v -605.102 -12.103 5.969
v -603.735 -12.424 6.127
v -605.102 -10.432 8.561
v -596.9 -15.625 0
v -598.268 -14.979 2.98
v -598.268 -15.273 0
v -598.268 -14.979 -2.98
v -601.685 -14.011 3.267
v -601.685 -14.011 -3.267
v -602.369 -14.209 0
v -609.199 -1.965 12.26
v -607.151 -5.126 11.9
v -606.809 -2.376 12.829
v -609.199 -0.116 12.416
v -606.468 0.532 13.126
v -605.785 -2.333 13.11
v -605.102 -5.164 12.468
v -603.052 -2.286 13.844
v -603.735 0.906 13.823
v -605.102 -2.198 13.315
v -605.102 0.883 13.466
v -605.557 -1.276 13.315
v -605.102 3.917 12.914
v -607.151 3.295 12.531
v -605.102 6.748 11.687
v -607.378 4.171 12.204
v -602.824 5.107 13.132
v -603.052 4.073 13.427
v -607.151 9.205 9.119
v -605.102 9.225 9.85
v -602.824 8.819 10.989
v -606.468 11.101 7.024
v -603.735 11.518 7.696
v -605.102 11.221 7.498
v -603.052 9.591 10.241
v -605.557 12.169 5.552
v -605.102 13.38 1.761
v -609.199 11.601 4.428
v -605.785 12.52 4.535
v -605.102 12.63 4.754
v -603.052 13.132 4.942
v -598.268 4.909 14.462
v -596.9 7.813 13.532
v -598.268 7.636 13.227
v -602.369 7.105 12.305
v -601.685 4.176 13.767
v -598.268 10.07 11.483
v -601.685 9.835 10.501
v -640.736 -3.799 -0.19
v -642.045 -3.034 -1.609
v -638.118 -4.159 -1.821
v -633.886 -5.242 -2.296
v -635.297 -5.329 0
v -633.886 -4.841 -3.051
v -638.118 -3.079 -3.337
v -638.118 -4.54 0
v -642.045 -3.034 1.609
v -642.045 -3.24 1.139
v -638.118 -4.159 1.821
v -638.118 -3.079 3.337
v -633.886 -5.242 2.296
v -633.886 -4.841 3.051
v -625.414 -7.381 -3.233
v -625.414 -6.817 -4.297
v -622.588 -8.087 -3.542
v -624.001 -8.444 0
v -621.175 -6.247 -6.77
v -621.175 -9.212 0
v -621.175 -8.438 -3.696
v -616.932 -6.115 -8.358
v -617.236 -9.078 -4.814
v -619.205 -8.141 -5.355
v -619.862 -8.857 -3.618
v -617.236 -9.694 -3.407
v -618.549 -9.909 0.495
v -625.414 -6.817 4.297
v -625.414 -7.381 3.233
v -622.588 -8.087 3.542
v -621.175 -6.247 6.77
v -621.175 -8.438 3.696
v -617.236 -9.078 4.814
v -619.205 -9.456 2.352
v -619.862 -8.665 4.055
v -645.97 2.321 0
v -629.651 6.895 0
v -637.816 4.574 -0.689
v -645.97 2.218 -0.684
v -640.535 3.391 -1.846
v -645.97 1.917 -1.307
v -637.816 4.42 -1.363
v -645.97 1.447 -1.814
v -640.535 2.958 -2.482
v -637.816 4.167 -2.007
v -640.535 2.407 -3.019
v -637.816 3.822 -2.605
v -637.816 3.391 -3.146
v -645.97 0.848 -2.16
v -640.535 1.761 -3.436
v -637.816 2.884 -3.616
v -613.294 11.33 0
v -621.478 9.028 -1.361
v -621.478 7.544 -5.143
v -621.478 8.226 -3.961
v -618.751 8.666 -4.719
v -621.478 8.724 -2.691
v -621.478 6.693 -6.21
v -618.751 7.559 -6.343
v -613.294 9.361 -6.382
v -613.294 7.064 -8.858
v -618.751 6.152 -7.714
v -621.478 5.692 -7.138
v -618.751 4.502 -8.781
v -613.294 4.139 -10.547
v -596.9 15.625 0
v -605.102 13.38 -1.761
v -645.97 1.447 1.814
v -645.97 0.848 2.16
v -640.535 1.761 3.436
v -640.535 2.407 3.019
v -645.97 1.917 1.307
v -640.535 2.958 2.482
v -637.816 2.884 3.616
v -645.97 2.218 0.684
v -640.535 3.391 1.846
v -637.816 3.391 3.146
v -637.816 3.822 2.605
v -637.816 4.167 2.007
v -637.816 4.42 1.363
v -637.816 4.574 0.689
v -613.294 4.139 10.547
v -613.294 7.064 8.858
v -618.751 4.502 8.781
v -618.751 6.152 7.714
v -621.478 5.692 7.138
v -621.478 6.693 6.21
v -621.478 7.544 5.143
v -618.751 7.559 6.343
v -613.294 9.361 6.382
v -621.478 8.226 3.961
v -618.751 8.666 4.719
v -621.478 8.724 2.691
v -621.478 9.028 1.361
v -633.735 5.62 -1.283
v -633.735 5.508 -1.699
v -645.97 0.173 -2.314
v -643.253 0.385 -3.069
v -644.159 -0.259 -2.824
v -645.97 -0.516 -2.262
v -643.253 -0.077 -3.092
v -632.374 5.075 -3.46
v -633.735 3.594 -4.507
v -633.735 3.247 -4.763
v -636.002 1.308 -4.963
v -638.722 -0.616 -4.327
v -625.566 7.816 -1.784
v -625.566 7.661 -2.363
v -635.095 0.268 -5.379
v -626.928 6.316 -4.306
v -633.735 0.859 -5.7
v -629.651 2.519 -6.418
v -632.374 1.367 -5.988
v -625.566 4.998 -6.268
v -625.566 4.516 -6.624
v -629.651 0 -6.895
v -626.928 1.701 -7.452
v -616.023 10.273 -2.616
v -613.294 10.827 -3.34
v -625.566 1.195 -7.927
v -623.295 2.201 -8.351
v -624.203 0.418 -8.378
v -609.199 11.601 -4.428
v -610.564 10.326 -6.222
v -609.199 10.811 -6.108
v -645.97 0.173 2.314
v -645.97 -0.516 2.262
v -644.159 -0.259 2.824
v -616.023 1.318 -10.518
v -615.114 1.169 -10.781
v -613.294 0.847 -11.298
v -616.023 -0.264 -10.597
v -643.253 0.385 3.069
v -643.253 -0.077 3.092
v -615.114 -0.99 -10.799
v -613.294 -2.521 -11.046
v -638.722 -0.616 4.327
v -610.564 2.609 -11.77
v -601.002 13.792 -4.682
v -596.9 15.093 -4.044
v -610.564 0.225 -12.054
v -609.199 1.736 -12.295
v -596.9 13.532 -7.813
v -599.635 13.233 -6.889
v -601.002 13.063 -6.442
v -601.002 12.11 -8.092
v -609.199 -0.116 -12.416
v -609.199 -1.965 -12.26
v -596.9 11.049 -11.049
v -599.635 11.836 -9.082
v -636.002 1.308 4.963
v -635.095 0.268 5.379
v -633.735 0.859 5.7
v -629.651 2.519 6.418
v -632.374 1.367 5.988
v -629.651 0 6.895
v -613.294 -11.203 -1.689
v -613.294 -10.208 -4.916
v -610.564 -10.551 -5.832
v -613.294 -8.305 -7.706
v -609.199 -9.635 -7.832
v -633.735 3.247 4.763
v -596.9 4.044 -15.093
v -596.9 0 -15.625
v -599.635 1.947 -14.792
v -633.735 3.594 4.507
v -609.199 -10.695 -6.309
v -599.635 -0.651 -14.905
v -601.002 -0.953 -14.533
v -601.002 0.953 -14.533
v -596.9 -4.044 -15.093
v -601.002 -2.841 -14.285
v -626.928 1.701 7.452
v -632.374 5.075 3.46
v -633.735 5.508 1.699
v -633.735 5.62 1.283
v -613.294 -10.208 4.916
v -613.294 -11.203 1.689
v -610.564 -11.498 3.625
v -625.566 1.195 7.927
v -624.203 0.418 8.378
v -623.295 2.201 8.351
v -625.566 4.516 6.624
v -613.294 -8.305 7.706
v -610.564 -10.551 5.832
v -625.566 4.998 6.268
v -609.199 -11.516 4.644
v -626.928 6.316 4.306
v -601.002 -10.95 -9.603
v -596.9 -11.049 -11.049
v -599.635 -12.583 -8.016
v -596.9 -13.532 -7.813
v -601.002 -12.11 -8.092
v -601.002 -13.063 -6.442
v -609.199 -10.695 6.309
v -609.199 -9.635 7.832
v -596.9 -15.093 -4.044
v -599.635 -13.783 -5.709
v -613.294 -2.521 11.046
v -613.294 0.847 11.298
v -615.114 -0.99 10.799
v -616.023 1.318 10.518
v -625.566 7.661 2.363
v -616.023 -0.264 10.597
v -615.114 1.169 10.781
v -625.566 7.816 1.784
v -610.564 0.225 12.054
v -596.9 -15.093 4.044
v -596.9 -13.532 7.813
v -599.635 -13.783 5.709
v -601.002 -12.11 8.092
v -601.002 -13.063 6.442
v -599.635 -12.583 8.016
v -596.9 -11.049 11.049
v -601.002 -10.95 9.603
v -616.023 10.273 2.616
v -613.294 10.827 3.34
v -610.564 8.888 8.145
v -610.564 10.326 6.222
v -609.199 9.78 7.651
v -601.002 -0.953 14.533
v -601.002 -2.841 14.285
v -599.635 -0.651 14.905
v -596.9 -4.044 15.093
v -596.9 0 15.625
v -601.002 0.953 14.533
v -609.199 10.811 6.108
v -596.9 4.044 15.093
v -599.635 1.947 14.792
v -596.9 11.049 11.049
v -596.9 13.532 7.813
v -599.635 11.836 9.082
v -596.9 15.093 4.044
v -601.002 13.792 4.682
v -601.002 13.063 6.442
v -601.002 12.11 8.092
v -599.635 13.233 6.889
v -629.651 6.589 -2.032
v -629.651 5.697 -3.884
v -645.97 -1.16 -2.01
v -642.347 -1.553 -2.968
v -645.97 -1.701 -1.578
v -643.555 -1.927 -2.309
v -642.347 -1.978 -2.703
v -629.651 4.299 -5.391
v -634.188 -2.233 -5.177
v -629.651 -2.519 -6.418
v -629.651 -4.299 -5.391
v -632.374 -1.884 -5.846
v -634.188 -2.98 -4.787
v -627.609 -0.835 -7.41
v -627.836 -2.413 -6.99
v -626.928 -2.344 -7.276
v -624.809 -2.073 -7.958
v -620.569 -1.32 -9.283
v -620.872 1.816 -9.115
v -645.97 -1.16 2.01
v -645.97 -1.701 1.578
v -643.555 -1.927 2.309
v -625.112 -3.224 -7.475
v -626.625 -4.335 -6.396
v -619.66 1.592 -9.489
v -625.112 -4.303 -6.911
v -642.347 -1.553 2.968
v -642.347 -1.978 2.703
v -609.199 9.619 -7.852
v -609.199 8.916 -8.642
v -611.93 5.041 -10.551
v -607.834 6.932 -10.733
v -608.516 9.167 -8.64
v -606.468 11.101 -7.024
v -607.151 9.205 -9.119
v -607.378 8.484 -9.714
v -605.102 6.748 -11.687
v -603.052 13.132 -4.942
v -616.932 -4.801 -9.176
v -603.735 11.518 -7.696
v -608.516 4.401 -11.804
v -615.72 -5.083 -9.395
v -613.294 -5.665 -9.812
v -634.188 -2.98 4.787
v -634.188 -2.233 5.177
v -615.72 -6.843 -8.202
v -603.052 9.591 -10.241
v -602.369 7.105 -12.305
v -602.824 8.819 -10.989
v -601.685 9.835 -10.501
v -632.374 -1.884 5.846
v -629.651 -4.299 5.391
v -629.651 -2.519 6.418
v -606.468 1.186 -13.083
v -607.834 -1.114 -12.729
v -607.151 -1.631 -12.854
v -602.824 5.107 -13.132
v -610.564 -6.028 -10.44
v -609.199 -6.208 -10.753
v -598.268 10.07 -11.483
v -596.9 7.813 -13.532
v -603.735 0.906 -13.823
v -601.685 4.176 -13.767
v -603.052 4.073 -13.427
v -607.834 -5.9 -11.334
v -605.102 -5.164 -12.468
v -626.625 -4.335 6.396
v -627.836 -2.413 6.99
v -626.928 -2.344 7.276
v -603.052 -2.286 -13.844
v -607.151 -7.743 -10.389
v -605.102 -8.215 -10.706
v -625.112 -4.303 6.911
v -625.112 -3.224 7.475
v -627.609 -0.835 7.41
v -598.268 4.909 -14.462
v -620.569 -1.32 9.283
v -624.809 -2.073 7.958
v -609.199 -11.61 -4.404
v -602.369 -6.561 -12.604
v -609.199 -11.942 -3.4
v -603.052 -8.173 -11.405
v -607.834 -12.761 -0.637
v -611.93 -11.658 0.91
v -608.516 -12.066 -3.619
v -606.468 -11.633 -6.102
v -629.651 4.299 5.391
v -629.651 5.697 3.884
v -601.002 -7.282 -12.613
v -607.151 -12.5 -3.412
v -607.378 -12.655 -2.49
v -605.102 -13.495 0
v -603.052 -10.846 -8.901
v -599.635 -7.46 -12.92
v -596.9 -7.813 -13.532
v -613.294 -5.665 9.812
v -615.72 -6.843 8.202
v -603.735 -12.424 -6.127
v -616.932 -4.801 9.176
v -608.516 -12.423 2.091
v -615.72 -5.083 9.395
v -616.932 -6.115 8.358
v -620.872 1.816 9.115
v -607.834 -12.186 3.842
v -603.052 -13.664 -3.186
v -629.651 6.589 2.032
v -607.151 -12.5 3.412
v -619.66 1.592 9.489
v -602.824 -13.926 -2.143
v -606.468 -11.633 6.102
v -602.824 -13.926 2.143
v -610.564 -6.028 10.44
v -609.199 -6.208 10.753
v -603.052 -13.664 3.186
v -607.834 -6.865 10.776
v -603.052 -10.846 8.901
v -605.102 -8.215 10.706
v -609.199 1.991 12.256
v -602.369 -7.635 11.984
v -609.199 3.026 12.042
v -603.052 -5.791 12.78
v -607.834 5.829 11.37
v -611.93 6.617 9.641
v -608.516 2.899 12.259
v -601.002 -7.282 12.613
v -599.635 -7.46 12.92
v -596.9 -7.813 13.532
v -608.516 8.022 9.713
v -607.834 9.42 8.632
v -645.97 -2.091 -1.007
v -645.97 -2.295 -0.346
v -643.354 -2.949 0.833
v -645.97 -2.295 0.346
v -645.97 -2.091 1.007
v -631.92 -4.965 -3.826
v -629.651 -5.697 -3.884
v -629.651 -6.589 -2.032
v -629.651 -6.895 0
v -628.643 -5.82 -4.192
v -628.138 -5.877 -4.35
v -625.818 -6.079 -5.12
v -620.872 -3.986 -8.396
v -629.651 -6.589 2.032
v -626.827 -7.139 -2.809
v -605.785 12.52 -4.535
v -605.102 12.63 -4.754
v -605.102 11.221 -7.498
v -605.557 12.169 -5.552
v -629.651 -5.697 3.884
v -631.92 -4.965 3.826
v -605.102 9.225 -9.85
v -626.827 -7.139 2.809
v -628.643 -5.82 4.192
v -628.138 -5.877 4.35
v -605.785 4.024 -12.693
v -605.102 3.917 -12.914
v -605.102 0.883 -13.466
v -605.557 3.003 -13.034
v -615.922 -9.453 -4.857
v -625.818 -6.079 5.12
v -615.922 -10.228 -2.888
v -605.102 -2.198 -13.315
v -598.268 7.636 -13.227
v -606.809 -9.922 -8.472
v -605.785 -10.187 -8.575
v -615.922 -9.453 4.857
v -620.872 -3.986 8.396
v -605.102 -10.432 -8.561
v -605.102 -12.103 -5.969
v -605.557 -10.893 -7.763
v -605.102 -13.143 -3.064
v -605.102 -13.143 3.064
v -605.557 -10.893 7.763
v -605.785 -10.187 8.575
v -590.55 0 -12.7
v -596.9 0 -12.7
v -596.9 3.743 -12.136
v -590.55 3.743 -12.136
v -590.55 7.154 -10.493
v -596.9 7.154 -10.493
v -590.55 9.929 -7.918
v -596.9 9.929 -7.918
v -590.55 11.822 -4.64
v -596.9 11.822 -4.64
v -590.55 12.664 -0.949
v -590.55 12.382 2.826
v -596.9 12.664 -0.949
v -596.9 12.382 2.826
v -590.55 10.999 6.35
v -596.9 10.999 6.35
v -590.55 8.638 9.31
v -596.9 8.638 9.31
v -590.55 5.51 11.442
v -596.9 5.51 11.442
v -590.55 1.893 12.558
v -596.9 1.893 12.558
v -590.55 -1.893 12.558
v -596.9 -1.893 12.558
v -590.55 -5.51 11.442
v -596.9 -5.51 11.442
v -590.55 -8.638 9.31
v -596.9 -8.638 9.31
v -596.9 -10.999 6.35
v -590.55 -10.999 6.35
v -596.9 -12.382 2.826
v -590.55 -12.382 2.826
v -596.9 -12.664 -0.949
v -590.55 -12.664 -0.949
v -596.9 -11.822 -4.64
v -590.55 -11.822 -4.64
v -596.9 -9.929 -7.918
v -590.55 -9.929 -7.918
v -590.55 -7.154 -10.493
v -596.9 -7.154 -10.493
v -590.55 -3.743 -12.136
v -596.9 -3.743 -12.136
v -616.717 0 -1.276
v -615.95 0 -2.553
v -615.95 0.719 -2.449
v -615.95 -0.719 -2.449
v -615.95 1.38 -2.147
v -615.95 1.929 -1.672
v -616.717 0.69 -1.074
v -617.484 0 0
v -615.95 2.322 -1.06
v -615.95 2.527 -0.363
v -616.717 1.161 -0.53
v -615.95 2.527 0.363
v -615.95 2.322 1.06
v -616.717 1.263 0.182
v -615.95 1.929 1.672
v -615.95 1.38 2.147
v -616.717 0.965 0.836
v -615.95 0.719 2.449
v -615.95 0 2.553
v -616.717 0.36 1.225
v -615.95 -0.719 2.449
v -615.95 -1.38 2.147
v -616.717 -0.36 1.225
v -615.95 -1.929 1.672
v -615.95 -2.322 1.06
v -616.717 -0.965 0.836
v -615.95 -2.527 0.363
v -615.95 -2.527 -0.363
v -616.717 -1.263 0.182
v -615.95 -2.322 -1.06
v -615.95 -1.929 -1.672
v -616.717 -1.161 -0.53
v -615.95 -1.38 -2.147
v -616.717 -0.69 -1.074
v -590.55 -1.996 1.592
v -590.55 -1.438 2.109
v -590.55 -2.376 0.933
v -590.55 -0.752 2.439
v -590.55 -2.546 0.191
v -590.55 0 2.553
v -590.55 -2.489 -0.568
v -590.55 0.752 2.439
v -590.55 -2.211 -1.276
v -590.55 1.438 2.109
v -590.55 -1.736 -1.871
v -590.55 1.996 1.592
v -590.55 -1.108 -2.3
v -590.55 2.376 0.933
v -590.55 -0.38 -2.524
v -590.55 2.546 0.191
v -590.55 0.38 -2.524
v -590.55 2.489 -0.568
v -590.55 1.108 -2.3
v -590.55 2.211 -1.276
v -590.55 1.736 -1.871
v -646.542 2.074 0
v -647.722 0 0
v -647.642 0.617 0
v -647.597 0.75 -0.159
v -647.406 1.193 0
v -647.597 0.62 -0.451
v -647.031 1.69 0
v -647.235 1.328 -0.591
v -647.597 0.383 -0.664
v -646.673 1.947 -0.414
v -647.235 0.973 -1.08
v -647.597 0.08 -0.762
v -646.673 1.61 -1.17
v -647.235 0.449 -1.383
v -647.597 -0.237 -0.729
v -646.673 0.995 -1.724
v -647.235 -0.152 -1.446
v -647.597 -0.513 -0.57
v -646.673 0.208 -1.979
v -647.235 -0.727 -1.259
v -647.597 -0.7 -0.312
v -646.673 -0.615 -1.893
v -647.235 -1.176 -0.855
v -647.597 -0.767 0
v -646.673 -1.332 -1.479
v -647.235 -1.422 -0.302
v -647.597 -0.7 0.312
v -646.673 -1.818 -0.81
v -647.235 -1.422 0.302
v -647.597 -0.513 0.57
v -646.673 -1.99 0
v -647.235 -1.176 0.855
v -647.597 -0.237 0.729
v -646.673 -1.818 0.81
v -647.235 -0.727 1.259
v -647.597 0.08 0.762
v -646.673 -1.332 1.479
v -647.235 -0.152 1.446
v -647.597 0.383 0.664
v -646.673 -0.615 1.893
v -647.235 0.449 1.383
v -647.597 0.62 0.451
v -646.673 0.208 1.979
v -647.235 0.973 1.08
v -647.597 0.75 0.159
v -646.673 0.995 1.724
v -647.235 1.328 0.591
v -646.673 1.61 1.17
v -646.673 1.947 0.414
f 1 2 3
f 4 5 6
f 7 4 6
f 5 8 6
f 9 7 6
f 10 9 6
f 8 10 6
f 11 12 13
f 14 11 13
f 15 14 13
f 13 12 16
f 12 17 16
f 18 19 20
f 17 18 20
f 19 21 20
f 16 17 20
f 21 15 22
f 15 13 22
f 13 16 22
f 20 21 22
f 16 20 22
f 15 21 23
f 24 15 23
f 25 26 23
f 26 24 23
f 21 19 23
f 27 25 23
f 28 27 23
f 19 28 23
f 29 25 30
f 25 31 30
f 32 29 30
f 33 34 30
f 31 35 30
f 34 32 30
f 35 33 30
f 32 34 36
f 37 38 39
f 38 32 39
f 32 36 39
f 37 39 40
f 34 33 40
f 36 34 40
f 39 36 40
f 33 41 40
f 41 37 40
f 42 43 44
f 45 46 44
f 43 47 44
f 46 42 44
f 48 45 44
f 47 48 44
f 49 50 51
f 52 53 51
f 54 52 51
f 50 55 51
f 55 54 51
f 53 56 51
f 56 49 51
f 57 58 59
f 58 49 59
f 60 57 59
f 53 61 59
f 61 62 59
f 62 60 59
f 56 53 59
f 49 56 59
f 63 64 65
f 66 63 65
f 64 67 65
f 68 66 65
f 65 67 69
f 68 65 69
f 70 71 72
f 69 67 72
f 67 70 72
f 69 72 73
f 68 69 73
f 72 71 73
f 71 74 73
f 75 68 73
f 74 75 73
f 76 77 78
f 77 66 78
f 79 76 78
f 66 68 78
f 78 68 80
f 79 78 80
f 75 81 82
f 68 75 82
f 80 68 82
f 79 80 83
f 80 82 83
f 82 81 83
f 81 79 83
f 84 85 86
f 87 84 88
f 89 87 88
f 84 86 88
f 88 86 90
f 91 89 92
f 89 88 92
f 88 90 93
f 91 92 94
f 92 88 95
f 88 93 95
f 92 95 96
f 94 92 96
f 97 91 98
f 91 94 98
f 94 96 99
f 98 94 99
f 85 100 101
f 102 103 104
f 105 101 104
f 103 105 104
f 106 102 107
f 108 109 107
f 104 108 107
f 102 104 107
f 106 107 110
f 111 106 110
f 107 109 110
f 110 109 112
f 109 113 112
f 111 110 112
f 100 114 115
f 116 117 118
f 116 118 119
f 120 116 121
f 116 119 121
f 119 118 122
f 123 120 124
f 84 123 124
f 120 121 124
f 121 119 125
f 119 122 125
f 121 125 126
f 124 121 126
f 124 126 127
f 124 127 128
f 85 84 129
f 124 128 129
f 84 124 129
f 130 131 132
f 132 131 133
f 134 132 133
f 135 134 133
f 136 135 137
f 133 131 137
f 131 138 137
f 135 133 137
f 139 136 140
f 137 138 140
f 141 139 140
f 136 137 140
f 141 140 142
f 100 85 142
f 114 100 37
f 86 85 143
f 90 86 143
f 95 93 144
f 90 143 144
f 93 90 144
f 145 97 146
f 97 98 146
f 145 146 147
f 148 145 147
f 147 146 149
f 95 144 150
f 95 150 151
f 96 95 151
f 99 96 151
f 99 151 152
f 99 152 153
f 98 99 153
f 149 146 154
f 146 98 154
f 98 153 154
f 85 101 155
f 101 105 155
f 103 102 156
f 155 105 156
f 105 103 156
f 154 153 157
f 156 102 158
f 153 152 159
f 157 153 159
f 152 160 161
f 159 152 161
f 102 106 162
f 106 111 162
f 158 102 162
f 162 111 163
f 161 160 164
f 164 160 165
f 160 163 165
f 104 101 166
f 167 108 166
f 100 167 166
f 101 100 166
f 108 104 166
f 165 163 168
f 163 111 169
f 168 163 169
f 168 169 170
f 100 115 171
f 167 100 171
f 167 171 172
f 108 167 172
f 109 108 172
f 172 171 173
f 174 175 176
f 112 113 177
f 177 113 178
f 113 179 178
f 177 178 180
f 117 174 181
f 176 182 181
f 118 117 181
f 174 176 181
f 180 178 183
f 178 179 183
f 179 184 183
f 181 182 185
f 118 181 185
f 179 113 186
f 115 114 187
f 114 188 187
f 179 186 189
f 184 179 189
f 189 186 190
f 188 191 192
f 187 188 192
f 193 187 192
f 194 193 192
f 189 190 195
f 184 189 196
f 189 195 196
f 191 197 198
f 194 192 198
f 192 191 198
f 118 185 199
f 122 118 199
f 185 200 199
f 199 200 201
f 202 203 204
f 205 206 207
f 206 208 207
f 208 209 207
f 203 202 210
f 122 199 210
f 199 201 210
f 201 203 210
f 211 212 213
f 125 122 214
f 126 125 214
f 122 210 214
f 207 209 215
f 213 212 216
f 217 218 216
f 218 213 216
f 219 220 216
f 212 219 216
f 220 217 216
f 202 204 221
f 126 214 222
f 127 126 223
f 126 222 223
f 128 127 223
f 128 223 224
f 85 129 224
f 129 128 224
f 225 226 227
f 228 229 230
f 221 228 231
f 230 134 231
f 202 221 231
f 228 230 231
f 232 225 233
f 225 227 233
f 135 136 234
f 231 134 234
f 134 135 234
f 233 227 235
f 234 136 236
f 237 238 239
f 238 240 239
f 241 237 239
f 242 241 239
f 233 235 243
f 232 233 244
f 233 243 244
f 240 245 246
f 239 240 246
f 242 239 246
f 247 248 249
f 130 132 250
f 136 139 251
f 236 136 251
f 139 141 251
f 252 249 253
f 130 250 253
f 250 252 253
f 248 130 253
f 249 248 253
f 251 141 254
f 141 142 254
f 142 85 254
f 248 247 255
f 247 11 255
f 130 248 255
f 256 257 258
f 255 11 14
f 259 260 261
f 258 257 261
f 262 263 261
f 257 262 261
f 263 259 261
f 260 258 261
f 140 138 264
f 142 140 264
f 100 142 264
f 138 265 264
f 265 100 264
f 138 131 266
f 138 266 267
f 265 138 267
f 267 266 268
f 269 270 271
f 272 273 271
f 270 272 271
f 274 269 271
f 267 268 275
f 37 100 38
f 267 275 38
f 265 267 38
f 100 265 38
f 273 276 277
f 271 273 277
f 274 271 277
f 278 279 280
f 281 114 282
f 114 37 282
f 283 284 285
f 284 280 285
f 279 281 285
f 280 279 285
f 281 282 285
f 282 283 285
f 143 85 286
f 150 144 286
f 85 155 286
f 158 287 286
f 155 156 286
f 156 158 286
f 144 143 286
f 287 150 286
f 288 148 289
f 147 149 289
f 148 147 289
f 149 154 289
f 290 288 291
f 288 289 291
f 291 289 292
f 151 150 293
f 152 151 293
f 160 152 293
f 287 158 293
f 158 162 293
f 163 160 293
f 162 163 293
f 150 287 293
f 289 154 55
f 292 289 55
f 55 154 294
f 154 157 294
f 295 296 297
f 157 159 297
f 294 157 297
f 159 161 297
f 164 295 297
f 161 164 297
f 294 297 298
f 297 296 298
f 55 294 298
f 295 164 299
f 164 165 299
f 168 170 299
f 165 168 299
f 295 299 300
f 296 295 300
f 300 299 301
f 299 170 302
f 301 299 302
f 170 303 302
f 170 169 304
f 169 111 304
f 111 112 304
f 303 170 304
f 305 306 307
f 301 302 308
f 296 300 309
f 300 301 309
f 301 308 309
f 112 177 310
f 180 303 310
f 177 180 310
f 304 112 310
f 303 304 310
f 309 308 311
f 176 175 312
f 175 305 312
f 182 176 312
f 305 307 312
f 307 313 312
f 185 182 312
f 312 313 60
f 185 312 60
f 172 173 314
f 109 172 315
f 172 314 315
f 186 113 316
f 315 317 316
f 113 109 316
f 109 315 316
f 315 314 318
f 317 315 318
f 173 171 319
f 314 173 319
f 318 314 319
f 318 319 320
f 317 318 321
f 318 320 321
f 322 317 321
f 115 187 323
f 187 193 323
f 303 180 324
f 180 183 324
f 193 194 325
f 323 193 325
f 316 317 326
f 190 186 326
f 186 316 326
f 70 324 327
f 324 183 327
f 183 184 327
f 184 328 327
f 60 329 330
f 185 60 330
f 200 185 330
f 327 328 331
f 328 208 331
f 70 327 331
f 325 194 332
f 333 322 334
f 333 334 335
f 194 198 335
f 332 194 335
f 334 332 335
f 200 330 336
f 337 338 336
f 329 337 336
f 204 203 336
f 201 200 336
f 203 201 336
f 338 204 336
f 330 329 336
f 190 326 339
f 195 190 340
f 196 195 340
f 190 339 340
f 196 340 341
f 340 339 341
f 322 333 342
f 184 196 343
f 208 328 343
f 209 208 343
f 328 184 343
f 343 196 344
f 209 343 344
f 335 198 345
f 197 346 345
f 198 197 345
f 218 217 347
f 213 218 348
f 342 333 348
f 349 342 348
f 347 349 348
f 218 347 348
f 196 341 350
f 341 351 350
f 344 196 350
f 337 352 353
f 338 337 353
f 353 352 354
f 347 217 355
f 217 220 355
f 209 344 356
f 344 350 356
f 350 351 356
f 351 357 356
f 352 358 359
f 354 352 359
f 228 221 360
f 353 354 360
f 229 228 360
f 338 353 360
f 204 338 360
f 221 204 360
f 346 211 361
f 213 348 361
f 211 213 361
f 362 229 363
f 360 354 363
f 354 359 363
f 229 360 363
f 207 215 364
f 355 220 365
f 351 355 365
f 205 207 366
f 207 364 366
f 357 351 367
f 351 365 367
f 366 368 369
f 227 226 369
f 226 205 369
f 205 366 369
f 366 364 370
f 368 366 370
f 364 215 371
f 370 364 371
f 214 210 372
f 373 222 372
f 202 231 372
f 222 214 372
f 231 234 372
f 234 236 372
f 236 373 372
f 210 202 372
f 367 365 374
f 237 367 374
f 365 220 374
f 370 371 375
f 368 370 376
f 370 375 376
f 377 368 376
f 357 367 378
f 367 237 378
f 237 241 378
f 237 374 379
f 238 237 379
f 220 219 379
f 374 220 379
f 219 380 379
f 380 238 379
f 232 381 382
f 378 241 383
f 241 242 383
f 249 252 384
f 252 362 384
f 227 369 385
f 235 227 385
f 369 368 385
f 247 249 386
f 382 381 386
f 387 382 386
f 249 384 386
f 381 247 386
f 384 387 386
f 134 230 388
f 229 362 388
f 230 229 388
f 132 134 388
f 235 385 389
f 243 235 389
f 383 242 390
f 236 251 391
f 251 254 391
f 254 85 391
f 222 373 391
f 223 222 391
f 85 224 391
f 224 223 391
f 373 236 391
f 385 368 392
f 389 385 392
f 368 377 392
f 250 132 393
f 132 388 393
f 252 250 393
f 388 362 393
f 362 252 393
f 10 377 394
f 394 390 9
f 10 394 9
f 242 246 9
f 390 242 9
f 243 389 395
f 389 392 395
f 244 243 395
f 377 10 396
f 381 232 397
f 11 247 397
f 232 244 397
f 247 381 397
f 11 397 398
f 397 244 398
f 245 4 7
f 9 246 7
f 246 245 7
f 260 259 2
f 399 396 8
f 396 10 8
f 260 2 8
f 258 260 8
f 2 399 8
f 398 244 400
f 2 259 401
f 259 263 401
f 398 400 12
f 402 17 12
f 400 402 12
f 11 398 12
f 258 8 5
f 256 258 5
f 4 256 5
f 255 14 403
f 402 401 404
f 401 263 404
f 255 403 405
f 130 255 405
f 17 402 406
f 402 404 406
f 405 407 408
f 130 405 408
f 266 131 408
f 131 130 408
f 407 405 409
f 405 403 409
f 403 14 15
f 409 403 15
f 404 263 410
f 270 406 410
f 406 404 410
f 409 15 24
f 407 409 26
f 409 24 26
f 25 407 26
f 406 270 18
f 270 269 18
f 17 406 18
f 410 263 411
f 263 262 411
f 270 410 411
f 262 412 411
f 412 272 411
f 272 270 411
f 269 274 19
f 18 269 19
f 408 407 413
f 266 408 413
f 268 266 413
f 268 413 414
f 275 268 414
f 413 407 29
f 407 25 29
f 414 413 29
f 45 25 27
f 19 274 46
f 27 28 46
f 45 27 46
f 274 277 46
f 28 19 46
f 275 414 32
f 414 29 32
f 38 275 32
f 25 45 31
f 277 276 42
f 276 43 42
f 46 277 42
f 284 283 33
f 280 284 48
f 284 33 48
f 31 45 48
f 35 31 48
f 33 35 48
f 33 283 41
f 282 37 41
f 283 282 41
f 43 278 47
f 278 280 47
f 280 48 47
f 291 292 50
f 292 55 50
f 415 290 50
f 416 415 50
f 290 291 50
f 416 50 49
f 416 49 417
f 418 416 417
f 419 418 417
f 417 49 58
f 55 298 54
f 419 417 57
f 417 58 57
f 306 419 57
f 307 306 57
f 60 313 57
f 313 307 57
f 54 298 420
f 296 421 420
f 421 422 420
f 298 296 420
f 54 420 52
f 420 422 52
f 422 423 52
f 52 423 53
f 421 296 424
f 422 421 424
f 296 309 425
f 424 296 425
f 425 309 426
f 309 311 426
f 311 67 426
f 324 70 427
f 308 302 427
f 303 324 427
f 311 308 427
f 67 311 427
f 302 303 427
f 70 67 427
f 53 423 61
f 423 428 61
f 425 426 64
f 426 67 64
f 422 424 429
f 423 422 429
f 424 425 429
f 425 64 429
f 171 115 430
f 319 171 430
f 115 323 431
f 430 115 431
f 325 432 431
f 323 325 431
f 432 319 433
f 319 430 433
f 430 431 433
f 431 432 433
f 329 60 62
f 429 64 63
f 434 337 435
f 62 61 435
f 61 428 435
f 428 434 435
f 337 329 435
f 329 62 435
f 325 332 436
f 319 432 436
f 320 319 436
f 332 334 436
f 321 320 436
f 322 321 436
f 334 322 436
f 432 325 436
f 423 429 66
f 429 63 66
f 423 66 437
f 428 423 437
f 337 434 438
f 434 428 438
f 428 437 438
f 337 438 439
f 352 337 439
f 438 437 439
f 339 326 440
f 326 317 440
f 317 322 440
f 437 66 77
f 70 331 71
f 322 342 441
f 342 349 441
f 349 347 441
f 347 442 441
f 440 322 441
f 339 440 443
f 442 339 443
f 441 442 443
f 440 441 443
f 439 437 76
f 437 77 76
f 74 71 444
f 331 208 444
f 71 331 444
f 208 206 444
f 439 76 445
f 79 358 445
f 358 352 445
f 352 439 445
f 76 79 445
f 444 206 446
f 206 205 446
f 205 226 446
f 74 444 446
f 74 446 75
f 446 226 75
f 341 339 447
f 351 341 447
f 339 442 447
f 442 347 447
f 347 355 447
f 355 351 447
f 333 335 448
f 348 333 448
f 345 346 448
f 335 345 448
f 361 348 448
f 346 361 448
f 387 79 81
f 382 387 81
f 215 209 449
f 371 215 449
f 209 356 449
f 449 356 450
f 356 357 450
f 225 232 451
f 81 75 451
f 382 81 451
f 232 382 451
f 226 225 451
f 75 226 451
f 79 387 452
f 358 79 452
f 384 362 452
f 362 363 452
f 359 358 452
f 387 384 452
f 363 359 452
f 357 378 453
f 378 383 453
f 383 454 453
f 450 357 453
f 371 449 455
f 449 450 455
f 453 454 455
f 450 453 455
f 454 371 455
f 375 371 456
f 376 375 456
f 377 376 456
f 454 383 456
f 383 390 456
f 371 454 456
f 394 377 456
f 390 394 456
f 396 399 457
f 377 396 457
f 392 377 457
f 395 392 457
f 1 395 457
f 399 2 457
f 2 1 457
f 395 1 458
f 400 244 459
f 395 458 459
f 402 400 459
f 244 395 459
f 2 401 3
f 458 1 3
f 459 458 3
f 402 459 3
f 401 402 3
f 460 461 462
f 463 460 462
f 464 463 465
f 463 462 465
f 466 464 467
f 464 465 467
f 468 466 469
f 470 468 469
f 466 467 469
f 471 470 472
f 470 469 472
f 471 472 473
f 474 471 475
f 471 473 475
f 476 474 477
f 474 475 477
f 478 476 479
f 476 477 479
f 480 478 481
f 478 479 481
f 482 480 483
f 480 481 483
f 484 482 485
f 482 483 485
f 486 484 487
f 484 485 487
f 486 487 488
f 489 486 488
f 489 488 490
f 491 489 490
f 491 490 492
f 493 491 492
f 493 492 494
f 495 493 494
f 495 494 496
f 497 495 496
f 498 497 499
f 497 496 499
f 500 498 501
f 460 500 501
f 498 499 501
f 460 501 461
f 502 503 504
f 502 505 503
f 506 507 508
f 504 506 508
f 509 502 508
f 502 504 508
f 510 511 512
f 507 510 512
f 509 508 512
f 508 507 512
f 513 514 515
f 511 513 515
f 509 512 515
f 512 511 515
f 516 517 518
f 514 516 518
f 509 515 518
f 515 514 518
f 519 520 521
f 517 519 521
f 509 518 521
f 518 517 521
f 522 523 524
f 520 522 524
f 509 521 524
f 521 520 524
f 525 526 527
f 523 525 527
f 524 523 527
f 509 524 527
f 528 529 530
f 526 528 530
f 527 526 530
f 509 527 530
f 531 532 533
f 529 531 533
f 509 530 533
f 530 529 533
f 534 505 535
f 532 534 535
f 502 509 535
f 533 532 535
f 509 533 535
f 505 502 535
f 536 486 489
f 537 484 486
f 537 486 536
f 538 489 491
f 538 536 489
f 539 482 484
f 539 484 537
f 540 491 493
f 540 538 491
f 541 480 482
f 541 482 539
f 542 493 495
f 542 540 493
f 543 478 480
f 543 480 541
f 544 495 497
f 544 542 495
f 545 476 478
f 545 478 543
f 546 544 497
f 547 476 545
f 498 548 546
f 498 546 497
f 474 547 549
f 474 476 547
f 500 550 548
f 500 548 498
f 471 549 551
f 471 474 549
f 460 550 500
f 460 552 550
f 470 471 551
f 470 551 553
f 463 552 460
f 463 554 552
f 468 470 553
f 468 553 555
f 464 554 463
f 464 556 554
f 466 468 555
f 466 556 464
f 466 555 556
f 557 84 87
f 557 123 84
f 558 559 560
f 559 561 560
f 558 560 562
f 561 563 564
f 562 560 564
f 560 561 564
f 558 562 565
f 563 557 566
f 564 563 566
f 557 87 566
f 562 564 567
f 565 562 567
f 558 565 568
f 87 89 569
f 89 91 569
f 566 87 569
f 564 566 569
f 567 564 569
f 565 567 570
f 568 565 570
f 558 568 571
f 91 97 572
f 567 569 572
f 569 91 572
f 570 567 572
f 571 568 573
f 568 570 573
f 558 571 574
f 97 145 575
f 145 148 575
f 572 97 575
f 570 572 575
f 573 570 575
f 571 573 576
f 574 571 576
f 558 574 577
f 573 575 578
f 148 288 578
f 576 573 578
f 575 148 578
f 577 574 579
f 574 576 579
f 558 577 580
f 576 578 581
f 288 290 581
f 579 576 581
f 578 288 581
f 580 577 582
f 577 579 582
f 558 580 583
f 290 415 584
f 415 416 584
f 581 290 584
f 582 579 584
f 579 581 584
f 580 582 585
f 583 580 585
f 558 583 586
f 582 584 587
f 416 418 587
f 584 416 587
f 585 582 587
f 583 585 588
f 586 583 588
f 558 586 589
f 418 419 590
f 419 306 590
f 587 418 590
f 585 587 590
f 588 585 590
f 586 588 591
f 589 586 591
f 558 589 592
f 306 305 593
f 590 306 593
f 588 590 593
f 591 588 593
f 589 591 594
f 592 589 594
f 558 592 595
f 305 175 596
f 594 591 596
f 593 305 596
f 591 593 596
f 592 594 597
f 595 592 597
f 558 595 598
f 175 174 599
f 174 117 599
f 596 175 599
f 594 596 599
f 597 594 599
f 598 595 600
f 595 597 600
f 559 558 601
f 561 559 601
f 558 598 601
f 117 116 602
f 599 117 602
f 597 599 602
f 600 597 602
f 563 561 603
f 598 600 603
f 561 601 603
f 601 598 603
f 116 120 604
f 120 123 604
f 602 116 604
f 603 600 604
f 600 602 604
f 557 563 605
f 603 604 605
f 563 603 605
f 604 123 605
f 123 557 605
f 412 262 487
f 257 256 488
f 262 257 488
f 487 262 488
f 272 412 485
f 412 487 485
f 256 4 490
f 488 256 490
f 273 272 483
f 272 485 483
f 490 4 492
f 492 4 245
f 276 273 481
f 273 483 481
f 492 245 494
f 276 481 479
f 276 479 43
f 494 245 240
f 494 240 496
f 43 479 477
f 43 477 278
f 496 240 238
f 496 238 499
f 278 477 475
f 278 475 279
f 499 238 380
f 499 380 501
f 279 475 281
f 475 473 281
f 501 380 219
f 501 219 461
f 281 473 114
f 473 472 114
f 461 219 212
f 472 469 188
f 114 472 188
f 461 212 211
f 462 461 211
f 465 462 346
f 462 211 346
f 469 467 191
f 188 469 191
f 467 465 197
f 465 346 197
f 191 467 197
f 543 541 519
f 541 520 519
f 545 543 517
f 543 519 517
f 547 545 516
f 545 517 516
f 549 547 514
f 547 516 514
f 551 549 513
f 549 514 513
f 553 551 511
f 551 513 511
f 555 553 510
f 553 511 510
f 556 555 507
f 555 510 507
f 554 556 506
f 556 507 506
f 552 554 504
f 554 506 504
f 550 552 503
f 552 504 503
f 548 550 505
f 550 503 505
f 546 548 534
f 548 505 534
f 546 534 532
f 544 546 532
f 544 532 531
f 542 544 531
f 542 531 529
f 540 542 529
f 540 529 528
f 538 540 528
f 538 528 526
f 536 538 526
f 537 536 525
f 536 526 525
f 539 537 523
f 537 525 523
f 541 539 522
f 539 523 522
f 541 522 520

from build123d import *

# Parameters (mm, degrees)
SKETCH2_R                       = 12.7
BOSS_EXTRUDE1_DEPTH             = 6.35
TAP_DRILL_FOR_1_4_20_TAP1_D     = 5.1054
TAP_DRILL_FOR_1_4_20_TAP1_DEPTH = 25.4
TAP_DRILL_FOR_1_4_20_TAP1_TIP   = 1.533816902


with BuildPart() as part:
    # Sketch1 → Revolve2 (revolve)
    with BuildSketch(Plane.XY):
        with BuildLine():
            Line((-596.9, 0), (-647.721869411, 0))
            ThreePointArc((-647.721869411, 0), (-647.234752146, 1.453803526), (-645.970071075, 2.320642445))
            ThreePointArc((-645.970071075, 2.320642445), (-621.477598816, 9.129959938), (-596.9, 15.625315086))
            Line((-596.9, 15.625315086), (-596.9, 0))
        make_face()
    revolve(axis=Axis((0, 0, 0), (-1, 0, 0)))

    # Sketch2 → Boss-Extrude1 (add)
    with BuildSketch(Plane(origin=(-596.9, 0, 0), x_dir=(0, 0, -1), z_dir=(1, 0, 0))):
        Circle(SKETCH2_R)
    extrude(amount=BOSS_EXTRUDE1_DEPTH)

    # Tap Drill for 1/4-20 Tap1
    with Locations(Plane(origin=(-590.55, 0, 0), x_dir=(0, 0, -1), z_dir=(1, 0, 0))):
        with Locations((0, 0)):
            Hole(TAP_DRILL_FOR_1_4_20_TAP1_D / 2, depth=TAP_DRILL_FOR_1_4_20_TAP1_DEPTH)
            with Locations((0, 0, -(TAP_DRILL_FOR_1_4_20_TAP1_DEPTH + TAP_DRILL_FOR_1_4_20_TAP1_TIP / 2))):  # 118° drill point
                Cone(0, TAP_DRILL_FOR_1_4_20_TAP1_D / 2, TAP_DRILL_FOR_1_4_20_TAP1_TIP, mode=Mode.SUBTRACT)


solid = part.part
